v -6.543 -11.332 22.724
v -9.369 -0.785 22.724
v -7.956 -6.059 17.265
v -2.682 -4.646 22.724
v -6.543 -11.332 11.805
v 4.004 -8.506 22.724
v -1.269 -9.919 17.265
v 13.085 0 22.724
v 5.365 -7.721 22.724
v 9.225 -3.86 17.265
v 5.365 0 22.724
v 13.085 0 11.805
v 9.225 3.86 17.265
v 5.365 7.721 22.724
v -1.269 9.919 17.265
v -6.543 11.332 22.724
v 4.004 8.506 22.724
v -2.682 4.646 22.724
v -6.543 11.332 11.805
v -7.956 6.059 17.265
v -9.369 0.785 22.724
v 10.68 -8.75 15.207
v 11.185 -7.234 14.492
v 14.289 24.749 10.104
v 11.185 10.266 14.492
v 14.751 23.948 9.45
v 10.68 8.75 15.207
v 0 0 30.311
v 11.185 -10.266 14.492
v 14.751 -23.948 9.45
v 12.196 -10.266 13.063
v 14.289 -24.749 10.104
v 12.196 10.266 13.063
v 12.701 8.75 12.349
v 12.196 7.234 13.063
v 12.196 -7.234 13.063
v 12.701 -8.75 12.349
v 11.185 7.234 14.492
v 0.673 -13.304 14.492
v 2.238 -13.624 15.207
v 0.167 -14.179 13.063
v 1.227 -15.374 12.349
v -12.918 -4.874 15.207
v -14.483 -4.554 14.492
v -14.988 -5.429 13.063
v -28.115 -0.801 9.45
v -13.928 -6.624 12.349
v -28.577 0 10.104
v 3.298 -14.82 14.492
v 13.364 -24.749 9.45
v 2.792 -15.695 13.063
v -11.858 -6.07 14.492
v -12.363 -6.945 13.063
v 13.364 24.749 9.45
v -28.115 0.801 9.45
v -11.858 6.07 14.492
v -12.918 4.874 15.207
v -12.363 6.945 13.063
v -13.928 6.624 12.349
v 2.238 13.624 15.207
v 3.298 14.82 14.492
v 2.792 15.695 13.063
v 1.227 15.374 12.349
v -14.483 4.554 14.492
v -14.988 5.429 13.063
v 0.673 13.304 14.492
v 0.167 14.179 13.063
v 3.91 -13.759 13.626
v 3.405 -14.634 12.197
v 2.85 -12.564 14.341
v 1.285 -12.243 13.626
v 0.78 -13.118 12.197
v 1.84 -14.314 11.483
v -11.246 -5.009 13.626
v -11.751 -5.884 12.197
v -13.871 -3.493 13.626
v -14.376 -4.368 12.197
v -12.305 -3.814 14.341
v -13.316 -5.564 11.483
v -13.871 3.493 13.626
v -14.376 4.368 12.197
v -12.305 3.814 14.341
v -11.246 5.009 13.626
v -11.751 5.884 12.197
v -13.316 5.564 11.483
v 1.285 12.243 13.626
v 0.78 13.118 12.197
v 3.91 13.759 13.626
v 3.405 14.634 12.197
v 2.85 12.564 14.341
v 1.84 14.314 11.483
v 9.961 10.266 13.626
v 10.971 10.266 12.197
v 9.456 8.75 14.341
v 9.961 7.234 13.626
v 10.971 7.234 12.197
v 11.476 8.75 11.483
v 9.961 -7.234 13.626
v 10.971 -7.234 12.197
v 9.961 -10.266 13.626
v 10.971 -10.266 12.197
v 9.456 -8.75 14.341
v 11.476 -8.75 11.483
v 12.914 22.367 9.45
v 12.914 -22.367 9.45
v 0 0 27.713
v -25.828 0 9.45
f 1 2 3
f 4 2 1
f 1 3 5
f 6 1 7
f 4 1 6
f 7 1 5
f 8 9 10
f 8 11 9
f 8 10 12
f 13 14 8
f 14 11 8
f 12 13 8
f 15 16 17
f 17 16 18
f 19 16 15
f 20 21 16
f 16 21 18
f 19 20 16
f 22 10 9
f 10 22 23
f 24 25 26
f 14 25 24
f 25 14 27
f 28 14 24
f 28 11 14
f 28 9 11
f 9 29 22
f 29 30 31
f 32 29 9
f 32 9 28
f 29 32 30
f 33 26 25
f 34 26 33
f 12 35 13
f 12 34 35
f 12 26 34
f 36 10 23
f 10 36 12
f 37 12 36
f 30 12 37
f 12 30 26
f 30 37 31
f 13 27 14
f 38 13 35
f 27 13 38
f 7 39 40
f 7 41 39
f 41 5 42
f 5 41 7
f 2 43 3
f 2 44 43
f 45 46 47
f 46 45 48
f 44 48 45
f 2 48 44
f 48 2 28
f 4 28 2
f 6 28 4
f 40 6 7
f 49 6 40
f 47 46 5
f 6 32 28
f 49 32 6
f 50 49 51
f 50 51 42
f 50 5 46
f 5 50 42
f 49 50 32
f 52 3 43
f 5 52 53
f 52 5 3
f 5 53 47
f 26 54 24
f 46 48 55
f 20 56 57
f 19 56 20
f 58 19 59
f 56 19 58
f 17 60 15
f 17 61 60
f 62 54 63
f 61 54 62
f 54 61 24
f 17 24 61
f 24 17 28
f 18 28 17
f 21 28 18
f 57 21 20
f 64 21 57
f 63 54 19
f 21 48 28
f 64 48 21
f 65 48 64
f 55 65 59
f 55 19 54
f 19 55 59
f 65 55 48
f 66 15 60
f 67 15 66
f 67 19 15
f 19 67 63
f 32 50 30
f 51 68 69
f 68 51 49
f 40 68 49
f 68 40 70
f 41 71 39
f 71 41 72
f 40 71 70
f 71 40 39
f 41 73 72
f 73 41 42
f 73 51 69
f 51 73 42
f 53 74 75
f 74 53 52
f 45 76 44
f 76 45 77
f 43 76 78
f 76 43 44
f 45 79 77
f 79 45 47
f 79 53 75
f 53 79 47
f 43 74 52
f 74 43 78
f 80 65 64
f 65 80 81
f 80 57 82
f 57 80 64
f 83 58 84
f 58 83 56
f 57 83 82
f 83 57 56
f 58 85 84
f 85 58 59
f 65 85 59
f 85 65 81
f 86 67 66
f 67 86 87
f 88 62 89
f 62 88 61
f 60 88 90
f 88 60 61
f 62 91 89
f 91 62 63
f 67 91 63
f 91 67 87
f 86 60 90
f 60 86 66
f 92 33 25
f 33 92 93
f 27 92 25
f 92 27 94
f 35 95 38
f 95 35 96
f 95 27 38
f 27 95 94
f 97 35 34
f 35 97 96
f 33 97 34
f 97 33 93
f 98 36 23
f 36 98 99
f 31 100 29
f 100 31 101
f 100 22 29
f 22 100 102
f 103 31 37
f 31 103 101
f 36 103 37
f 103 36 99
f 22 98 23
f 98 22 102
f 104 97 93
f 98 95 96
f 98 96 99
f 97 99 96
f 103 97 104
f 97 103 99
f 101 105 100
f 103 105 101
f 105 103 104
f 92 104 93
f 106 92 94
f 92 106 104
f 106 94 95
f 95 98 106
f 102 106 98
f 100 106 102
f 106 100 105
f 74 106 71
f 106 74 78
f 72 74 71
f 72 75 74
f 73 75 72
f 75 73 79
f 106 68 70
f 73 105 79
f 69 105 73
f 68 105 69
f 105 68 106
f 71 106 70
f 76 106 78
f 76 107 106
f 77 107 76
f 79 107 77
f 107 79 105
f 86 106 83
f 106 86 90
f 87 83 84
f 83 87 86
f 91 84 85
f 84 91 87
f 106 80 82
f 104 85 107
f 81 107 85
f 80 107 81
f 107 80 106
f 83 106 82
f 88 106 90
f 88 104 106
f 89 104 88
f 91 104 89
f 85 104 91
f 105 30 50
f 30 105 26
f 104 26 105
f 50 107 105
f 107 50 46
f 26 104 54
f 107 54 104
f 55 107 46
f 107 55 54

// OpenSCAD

c = 35;
t = 1.5;
s = 3.5;

intersection()
{
rotate( [ 45, -asin( 1 / sqrt( 3 ) ), 0 ] )
difference()
{
	union()
	{
		cube( [ c, c, c ], center = true );
		translate( [ 1, 1, 1 ]*(c/4.5) )
			for ( a = [ 0, 120, 240 ] ) rotate( a, [ 1, 1, 1 ] )
				translate( [ 0, 0, 1 ] * (6.5*c/35) )
					rotate( [ 45, asin( 1 / sqrt( 3 ) ), 0 ] )
						rotate( 45+180, [ -1, 1, 1 ] )
							cube( 11*c/35, center = true );
	}

		rotate( [ 0, 0, 0 ] )
			translate( [ 0, 0, 1 ] * c/2 ) rotate( [ 0, 0, 45 ] )
				translate( [ 1,0, 0 ] * 4.5*c/35 )
					for ( a = [ -1, +1 ] ) translate( (a+0.0)*[0,1,0] * c/2*0.5 )
					cylinder( r = s/2, h = c, center = true );
		rotate( [ 270, 0, 0 ] )
			translate( [ 0, 0, 1 ] * c/2 ) rotate( [ 0, 0, 270+45 ] )
				translate( [ 1,0, 0 ] * 4.5*c/35 )
					for ( a = [ -1, +1 ] ) translate( (a+0.0)*[0,1,0] * c/2*0.5 )				cylinder( r = s/2, h = c, center = true );
		rotate( [ 0, 90, 0 ] )
			translate( [ 0, 0, 1 ] * c/2 ) rotate( [ 0, 0, 90+45 ] )
				translate( [ 1,0, 0 ] * 4.5*c/35 )
					for ( a = [ -1, +1 ] ) translate( (a+0.0)*[0,1,0] * c/2*0.5 )					cylinder( r = s/2, h = c, center = true );

	cube( [ c-t*2, c-t*2, c-t*2 ], center = true );
}
translate( [ 0, 0, c*0.27+100 ] ) cube( 200, center = true );
}
